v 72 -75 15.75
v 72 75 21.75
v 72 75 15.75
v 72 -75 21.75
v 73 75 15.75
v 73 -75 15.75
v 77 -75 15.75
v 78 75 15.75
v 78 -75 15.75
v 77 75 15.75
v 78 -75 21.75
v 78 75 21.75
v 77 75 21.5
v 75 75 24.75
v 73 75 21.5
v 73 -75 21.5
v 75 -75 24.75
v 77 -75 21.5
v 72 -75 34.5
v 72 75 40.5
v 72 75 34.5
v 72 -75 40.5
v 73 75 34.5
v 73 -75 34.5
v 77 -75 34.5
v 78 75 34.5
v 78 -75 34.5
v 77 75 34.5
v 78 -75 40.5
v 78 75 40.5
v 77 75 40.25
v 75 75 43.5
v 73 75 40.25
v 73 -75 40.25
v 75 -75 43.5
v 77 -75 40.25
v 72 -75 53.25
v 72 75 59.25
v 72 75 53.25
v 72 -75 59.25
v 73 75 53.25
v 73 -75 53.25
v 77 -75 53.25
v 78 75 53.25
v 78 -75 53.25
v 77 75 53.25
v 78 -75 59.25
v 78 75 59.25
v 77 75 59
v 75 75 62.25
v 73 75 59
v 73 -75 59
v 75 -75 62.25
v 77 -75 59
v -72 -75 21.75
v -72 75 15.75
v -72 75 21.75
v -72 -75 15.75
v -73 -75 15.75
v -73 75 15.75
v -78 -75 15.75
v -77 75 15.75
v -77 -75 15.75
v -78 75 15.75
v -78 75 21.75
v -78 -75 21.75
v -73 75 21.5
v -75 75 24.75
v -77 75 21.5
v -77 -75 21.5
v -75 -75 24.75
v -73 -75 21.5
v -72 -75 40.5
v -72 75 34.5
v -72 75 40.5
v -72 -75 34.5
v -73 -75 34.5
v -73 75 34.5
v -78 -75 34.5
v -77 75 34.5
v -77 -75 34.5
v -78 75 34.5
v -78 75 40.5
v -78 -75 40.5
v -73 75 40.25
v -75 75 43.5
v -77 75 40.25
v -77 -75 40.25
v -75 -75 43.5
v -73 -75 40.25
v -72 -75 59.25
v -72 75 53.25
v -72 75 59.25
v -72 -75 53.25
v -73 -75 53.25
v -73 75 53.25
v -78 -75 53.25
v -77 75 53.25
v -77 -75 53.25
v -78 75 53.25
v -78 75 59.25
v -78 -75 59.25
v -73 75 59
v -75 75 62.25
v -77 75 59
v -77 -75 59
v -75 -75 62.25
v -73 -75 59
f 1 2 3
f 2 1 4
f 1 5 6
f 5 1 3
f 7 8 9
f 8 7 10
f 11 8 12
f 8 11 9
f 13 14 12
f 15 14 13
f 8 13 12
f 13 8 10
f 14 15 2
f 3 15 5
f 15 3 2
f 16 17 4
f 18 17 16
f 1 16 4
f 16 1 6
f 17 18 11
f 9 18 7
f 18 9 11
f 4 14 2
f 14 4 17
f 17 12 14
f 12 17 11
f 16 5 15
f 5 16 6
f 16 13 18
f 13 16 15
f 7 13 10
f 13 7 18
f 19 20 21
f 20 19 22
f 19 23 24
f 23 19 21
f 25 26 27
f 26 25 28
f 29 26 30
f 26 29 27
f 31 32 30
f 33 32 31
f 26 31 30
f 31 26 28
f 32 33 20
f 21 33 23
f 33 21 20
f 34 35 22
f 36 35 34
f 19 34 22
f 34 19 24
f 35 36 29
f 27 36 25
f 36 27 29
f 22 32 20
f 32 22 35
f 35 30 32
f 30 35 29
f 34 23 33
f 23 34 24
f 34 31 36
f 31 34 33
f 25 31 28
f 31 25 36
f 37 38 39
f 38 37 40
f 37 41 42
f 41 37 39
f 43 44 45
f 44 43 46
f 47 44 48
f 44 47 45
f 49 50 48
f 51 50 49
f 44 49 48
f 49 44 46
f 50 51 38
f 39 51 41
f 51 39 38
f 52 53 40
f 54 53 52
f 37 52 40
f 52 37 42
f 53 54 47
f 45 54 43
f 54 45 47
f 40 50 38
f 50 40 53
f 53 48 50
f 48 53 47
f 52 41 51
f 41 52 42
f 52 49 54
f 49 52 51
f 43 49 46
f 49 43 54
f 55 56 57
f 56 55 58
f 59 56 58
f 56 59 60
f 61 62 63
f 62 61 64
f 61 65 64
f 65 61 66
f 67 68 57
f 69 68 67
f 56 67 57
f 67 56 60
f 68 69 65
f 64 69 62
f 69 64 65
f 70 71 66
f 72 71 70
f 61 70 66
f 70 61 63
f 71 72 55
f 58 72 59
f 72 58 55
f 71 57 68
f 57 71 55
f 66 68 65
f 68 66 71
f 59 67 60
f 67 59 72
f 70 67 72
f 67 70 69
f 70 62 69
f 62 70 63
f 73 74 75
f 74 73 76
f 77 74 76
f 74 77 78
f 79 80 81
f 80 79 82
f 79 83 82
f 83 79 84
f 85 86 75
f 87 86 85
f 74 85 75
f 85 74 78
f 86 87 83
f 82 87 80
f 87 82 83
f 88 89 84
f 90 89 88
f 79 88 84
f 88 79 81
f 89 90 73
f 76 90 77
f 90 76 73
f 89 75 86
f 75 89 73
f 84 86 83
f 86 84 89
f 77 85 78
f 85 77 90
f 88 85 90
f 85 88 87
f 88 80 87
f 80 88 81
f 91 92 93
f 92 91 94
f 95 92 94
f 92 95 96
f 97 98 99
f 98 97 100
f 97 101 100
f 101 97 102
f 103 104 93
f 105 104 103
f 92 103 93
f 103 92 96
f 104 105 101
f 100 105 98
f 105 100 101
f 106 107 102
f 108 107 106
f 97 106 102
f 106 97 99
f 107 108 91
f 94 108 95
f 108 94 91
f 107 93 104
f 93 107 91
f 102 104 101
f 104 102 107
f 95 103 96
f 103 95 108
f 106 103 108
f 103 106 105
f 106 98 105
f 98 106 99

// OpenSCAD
$fn = 72;

height = 75;
sideLength = 150;

tracks();

module tracks()
{
    for (scaleFactor = [-1, 1])
    {
        scale([scaleFactor, 1, 1])
        for (zOffset = [height / 4, 2 * height / 4, 3 * height / 4])
        {
            translate([-sideLength/2, 0, zOffset])
            track_shape();
        }
    }
}

module track_mask()
{
    // Tracks
    for (scaleFactor = [-1, 1])
    {
        scale([scaleFactor, 1, 1])
        for (zOffset = [height / 4, 2 * height / 4, 3 * height / 4])
        {
            translate([-sideLength/2, 0, zOffset])
            track_shape(trackSize=6.2, channelSize=3.8);
        }
    }
}

module track_shape(trackSize=6, channelSize=4)
{
    // Module track
    roofWidth = sqrt(pow(trackSize, 2) / 2);

    difference()
    {
        union()
        {
            cube([trackSize, sideLength, trackSize], center=true);
            
            translate([0, 0, trackSize/2])
            rotate([0, 45, 0])
            cube([roofWidth, sideLength, roofWidth], center=true);
        }
            
        union()
        {
            translate([0, 0, -(1*trackSize/8)])
            cube([channelSize, sideLength+2, channelSize*1.75], center=true);
        }
    }
}
